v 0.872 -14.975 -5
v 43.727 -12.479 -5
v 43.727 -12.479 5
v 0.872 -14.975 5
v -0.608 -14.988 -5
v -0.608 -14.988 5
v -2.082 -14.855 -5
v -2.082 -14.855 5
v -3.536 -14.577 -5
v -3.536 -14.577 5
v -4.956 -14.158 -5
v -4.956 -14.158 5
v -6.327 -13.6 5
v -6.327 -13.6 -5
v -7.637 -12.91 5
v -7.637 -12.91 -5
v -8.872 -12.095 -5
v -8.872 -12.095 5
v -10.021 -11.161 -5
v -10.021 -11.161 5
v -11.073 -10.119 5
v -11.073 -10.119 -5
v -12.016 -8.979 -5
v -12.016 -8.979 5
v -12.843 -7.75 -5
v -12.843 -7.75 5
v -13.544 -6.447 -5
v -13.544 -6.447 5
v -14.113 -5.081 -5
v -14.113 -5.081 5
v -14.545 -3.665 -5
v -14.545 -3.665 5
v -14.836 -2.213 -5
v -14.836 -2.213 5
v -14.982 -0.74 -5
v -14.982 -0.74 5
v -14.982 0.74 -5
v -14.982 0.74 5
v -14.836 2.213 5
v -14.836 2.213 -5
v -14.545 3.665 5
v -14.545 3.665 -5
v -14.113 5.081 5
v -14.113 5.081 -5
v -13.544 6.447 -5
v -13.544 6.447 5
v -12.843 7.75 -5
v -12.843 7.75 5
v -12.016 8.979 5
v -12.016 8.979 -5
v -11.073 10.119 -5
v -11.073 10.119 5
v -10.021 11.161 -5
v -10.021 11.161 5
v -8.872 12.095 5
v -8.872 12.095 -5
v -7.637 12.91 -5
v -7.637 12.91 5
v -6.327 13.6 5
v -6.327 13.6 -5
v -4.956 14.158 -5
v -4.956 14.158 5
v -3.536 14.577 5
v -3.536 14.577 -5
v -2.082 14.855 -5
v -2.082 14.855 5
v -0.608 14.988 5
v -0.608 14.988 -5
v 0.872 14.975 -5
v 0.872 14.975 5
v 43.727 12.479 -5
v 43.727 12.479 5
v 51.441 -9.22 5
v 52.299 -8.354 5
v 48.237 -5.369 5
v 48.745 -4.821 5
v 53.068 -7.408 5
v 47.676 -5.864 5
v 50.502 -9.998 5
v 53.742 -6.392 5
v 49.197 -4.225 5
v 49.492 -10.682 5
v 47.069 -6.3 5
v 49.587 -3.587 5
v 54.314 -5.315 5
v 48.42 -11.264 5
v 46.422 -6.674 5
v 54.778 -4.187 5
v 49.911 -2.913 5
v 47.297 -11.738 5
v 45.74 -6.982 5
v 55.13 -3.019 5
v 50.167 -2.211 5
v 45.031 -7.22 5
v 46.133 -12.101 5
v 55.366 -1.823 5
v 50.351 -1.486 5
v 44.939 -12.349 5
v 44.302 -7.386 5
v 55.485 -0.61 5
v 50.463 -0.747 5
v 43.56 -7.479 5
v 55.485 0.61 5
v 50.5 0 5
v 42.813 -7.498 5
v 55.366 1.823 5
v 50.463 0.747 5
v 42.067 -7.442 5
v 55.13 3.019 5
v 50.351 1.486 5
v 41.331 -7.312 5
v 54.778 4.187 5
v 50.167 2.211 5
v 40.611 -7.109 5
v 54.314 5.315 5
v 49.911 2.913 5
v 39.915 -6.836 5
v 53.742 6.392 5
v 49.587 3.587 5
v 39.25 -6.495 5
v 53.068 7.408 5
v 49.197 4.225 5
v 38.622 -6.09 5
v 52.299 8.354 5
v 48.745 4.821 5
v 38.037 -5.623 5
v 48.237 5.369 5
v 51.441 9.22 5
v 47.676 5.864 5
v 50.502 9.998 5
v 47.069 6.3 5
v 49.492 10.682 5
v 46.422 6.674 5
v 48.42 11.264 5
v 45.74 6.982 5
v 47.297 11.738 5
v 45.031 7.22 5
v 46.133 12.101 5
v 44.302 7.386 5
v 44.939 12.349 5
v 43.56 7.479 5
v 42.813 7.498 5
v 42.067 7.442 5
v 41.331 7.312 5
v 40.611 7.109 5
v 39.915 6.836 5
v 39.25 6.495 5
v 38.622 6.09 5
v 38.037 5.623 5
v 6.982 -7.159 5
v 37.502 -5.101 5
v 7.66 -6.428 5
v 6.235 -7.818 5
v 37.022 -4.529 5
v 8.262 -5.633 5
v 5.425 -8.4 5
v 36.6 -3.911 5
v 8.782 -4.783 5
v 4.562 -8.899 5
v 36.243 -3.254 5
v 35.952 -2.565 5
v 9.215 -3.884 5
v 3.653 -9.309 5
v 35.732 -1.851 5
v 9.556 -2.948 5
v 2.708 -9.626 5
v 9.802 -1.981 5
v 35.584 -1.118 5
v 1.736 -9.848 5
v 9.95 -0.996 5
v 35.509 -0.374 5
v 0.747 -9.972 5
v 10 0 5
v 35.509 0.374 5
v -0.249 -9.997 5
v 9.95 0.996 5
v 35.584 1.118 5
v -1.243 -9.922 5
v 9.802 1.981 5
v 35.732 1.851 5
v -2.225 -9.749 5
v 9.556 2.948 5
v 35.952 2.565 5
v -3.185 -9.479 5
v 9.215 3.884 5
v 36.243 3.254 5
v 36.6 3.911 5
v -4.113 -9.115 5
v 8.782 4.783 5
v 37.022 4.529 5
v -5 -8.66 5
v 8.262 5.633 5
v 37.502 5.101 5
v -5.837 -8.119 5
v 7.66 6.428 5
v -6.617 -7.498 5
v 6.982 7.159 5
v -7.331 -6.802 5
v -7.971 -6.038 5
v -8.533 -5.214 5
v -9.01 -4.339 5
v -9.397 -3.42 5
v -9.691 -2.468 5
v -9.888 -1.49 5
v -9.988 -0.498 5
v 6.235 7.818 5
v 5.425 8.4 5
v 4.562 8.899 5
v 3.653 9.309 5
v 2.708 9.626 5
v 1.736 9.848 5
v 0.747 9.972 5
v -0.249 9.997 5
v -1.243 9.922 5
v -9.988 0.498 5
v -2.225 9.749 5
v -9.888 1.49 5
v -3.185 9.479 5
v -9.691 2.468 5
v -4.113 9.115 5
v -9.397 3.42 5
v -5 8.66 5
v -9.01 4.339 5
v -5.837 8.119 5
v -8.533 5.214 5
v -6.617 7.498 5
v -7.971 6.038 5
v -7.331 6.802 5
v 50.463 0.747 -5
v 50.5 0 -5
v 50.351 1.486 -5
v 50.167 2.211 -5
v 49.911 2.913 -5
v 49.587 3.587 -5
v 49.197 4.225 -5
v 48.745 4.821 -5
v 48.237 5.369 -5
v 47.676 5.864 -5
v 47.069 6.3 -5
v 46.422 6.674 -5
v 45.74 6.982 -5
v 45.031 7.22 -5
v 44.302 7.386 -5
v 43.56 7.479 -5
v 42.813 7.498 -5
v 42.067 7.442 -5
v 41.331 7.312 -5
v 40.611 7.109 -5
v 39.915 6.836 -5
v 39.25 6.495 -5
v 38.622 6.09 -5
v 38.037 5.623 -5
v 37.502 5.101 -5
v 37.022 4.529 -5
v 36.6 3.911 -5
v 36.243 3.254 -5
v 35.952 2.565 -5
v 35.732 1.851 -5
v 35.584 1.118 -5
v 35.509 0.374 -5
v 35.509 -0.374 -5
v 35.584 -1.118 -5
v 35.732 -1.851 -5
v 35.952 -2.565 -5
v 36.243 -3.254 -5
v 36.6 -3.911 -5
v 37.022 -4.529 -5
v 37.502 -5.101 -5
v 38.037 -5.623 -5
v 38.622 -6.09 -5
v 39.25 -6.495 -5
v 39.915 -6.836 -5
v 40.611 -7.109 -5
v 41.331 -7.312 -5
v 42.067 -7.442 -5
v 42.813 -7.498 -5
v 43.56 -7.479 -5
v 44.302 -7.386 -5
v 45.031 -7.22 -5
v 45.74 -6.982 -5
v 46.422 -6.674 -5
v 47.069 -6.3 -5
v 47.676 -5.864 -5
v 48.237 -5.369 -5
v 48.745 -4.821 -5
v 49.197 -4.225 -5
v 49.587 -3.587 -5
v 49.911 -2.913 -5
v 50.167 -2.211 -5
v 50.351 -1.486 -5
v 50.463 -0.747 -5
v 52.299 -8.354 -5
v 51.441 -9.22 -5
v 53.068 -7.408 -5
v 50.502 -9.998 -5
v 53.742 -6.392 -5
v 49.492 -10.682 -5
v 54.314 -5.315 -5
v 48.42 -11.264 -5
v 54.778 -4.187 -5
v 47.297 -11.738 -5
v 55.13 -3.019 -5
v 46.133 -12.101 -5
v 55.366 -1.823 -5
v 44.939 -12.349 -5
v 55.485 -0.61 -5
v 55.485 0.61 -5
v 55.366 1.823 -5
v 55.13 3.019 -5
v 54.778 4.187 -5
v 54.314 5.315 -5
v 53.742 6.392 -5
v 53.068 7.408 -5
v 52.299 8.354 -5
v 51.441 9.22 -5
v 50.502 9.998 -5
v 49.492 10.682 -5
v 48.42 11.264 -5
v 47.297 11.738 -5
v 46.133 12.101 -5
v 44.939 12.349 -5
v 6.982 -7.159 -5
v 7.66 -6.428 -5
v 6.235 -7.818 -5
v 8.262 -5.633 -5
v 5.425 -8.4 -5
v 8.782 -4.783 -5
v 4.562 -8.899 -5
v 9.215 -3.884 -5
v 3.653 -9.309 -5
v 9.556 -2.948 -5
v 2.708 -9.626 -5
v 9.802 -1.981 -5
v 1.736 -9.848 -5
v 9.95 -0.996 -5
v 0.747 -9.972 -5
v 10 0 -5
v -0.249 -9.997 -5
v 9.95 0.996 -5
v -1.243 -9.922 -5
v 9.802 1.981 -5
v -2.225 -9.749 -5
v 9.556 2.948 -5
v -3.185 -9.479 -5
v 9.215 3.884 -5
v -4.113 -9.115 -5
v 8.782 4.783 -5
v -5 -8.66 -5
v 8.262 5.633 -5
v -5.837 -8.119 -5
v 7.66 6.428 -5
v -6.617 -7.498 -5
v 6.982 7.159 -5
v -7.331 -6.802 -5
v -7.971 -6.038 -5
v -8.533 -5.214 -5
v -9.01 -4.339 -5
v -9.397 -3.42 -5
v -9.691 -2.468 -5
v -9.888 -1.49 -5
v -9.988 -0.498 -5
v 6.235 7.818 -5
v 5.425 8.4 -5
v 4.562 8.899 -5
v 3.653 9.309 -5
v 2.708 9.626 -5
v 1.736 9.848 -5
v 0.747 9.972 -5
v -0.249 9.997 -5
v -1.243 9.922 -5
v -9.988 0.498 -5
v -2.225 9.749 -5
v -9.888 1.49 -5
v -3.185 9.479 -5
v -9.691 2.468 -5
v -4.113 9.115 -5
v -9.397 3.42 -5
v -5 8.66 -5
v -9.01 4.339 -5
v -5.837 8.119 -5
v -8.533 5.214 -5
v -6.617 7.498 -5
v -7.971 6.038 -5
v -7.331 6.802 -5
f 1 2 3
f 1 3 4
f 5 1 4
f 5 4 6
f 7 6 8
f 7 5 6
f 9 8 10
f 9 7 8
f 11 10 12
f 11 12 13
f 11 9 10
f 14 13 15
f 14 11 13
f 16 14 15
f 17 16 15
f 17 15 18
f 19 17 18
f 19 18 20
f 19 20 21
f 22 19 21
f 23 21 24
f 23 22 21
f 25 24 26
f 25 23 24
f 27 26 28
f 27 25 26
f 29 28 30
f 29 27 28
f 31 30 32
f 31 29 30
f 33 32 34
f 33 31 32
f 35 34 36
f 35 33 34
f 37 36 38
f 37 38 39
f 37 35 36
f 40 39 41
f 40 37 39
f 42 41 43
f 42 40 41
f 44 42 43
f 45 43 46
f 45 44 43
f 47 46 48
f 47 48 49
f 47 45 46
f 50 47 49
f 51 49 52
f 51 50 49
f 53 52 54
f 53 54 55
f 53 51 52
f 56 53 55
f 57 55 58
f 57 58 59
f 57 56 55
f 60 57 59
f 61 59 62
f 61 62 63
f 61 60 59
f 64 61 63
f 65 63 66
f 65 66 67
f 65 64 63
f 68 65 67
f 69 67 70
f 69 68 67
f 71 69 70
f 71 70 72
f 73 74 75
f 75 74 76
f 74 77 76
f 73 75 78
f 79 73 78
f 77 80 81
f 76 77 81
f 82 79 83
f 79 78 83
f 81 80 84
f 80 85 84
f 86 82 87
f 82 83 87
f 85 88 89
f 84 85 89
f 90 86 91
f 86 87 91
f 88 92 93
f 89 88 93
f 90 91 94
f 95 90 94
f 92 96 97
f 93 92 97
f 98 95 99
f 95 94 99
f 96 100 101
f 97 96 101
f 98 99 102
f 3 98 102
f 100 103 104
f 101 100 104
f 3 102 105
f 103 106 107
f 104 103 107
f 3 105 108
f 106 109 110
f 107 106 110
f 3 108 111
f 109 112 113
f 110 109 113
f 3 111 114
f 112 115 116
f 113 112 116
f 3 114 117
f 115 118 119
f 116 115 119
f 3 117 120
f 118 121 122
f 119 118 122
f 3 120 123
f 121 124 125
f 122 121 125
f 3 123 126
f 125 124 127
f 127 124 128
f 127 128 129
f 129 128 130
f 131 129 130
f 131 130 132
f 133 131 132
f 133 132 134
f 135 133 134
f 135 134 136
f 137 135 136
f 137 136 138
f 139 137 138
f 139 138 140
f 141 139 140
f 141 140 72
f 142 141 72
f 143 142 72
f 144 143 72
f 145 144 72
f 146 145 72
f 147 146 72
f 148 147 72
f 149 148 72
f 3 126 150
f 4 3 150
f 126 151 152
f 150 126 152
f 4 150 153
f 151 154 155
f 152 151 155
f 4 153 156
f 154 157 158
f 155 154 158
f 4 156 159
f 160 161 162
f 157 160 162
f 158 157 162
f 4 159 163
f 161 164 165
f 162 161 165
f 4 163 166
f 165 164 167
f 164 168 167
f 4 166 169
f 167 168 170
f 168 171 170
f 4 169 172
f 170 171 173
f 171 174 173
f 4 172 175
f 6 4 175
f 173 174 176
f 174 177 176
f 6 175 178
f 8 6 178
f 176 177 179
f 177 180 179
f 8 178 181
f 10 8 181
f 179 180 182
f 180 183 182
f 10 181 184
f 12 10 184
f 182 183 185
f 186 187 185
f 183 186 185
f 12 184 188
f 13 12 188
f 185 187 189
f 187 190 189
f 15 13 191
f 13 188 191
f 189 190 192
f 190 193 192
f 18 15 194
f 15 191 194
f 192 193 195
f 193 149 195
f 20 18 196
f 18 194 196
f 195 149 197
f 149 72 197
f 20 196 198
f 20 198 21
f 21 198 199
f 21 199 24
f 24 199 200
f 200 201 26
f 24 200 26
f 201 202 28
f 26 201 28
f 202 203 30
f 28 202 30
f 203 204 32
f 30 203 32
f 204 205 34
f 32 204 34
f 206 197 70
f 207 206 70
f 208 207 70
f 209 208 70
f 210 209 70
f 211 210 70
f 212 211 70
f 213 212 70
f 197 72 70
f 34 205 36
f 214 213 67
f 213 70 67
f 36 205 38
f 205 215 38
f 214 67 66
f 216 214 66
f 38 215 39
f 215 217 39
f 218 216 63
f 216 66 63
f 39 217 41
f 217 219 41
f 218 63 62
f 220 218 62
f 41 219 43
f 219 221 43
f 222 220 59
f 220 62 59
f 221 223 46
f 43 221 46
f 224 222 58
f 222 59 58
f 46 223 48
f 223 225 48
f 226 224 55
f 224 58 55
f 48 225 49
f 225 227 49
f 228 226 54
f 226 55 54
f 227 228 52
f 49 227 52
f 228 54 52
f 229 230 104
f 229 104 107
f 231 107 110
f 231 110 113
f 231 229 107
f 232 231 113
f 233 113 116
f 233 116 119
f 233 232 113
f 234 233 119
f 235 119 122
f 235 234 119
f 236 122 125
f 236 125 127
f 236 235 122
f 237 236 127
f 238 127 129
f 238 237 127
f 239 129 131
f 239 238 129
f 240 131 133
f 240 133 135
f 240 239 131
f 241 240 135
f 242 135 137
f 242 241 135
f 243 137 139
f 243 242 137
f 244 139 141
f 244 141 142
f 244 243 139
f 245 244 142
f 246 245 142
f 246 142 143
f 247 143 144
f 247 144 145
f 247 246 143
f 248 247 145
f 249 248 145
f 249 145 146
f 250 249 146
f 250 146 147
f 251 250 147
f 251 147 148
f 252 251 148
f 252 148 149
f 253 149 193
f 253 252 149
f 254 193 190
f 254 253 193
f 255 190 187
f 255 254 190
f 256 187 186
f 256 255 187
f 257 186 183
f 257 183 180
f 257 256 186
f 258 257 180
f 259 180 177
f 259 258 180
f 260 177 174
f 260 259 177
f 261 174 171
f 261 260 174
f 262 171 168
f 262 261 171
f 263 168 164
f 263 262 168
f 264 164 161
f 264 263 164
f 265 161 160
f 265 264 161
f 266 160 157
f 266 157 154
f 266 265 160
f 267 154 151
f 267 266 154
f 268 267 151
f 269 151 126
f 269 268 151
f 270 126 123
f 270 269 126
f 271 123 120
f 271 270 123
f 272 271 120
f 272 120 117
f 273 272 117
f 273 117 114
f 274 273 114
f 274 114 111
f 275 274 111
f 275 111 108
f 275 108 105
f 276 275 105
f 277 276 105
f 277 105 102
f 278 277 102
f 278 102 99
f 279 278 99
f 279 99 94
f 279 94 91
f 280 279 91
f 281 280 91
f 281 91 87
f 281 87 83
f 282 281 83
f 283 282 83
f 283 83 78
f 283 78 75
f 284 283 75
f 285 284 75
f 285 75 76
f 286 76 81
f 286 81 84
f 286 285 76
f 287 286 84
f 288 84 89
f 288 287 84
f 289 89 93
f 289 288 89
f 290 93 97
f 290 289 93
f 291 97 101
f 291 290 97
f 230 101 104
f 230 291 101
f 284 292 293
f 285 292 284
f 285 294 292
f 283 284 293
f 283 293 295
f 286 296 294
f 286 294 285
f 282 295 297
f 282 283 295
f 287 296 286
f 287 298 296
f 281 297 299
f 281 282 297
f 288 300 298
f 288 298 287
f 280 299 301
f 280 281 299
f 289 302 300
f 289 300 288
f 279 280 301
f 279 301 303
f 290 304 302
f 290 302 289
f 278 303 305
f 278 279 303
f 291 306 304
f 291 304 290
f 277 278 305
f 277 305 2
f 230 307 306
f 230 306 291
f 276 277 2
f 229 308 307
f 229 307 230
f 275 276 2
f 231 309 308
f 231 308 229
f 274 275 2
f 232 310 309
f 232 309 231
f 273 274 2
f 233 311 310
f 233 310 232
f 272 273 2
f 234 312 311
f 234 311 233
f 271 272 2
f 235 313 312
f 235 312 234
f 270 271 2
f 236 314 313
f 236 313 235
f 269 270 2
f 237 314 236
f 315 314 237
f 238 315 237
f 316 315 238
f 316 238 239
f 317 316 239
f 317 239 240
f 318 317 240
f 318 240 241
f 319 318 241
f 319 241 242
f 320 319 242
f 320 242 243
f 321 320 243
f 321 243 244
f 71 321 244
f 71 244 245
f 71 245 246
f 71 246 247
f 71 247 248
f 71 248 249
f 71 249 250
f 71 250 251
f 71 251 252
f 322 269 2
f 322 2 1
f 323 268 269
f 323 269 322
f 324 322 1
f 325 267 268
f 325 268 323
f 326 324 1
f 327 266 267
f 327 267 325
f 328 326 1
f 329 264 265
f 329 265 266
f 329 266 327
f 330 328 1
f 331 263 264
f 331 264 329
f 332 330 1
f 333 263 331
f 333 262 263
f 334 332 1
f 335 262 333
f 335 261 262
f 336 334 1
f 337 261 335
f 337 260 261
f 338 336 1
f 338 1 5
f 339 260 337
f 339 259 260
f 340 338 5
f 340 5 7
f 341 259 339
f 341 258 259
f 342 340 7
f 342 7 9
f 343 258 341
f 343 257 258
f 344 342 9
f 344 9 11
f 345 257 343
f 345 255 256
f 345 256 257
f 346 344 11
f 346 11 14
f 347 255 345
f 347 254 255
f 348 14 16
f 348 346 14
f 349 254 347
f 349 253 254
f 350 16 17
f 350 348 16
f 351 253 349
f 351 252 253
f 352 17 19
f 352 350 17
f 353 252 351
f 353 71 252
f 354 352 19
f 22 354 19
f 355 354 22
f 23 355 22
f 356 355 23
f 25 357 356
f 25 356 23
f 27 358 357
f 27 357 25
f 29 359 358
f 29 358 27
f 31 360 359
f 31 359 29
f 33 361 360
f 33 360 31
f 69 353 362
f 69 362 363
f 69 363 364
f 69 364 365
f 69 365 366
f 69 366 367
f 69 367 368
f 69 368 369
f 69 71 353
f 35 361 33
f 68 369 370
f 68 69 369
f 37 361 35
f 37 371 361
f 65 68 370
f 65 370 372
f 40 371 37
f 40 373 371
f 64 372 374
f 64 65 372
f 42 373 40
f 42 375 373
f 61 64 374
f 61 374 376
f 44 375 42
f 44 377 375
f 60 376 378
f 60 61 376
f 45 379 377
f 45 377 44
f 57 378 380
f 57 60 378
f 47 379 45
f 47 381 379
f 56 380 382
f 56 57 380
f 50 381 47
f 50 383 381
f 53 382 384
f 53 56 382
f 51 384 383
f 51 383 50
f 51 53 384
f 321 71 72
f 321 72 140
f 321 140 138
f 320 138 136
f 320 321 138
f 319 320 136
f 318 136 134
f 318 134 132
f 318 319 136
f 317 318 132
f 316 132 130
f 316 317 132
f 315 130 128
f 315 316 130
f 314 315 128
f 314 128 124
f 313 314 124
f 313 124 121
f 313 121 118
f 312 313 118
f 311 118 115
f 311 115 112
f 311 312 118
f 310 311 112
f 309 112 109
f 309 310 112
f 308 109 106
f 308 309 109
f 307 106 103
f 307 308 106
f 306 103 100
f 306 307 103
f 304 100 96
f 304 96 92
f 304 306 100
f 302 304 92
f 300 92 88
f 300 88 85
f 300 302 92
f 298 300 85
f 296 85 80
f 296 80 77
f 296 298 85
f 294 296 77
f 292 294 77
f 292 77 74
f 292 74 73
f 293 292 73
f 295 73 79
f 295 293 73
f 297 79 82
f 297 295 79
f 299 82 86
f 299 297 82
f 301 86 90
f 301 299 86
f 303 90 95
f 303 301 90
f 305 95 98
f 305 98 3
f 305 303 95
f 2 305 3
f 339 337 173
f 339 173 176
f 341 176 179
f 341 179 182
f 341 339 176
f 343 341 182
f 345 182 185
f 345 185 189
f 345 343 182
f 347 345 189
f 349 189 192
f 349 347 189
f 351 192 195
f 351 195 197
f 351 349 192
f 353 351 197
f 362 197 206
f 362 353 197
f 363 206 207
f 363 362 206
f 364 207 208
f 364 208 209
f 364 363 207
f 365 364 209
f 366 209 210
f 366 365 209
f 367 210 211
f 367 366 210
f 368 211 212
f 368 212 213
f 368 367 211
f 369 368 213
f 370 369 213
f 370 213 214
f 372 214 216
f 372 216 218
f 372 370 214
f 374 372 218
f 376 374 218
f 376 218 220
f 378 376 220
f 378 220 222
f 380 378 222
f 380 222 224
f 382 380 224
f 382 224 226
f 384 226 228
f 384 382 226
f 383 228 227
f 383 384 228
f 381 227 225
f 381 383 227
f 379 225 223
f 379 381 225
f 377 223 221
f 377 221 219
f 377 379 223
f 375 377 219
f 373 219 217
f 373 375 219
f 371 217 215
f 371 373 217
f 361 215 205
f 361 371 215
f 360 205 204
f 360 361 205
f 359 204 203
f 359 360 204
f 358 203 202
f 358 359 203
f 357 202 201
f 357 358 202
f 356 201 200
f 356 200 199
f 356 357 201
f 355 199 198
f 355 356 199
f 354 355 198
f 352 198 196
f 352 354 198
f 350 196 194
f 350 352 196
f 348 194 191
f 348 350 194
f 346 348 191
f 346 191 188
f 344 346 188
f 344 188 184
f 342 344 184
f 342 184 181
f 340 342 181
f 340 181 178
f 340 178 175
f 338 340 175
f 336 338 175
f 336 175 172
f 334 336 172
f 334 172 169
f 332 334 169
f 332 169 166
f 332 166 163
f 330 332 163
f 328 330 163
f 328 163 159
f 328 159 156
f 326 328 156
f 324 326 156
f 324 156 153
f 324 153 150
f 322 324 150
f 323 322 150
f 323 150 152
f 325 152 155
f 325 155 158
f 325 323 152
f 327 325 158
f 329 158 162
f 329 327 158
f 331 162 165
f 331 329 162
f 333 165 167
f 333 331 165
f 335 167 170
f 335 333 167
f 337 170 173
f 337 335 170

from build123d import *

# Parameters (mm, degrees)
BOSS_EXTRUDE1_DEPTH      = 5
BOSS_EXTRUDE1_DEPTH_BACK = 5
SKETCH1_R                = 10
SKETCH1_R_2              = 7.5


with BuildPart() as part:
    # Sketch1 → Boss-Extrude1 (new, two sides: drawn at the far end of the back side and taken through both)
    with BuildSketch(Plane.XY.offset(-BOSS_EXTRUDE1_DEPTH_BACK)):
        with BuildLine():
            Line((0.872093023, 14.974626999), (43.726744186, 12.478855832))
            ThreePointArc((43.726744186, 12.478855832), (55.5, 0), (43.726744186, -12.478855832))
            Line((43.726744186, -12.478855832), (0.872093023, -14.974626999))
            ThreePointArc((0.872093023, -14.974626999), (-15, 0), (0.872093023, 14.974626999))
        make_face()
        Circle(SKETCH1_R, mode=Mode.SUBTRACT)
        with Locations((43, 0)):
            Circle(SKETCH1_R_2, mode=Mode.SUBTRACT)
    extrude(amount=BOSS_EXTRUDE1_DEPTH + BOSS_EXTRUDE1_DEPTH_BACK)


solid = part.part
